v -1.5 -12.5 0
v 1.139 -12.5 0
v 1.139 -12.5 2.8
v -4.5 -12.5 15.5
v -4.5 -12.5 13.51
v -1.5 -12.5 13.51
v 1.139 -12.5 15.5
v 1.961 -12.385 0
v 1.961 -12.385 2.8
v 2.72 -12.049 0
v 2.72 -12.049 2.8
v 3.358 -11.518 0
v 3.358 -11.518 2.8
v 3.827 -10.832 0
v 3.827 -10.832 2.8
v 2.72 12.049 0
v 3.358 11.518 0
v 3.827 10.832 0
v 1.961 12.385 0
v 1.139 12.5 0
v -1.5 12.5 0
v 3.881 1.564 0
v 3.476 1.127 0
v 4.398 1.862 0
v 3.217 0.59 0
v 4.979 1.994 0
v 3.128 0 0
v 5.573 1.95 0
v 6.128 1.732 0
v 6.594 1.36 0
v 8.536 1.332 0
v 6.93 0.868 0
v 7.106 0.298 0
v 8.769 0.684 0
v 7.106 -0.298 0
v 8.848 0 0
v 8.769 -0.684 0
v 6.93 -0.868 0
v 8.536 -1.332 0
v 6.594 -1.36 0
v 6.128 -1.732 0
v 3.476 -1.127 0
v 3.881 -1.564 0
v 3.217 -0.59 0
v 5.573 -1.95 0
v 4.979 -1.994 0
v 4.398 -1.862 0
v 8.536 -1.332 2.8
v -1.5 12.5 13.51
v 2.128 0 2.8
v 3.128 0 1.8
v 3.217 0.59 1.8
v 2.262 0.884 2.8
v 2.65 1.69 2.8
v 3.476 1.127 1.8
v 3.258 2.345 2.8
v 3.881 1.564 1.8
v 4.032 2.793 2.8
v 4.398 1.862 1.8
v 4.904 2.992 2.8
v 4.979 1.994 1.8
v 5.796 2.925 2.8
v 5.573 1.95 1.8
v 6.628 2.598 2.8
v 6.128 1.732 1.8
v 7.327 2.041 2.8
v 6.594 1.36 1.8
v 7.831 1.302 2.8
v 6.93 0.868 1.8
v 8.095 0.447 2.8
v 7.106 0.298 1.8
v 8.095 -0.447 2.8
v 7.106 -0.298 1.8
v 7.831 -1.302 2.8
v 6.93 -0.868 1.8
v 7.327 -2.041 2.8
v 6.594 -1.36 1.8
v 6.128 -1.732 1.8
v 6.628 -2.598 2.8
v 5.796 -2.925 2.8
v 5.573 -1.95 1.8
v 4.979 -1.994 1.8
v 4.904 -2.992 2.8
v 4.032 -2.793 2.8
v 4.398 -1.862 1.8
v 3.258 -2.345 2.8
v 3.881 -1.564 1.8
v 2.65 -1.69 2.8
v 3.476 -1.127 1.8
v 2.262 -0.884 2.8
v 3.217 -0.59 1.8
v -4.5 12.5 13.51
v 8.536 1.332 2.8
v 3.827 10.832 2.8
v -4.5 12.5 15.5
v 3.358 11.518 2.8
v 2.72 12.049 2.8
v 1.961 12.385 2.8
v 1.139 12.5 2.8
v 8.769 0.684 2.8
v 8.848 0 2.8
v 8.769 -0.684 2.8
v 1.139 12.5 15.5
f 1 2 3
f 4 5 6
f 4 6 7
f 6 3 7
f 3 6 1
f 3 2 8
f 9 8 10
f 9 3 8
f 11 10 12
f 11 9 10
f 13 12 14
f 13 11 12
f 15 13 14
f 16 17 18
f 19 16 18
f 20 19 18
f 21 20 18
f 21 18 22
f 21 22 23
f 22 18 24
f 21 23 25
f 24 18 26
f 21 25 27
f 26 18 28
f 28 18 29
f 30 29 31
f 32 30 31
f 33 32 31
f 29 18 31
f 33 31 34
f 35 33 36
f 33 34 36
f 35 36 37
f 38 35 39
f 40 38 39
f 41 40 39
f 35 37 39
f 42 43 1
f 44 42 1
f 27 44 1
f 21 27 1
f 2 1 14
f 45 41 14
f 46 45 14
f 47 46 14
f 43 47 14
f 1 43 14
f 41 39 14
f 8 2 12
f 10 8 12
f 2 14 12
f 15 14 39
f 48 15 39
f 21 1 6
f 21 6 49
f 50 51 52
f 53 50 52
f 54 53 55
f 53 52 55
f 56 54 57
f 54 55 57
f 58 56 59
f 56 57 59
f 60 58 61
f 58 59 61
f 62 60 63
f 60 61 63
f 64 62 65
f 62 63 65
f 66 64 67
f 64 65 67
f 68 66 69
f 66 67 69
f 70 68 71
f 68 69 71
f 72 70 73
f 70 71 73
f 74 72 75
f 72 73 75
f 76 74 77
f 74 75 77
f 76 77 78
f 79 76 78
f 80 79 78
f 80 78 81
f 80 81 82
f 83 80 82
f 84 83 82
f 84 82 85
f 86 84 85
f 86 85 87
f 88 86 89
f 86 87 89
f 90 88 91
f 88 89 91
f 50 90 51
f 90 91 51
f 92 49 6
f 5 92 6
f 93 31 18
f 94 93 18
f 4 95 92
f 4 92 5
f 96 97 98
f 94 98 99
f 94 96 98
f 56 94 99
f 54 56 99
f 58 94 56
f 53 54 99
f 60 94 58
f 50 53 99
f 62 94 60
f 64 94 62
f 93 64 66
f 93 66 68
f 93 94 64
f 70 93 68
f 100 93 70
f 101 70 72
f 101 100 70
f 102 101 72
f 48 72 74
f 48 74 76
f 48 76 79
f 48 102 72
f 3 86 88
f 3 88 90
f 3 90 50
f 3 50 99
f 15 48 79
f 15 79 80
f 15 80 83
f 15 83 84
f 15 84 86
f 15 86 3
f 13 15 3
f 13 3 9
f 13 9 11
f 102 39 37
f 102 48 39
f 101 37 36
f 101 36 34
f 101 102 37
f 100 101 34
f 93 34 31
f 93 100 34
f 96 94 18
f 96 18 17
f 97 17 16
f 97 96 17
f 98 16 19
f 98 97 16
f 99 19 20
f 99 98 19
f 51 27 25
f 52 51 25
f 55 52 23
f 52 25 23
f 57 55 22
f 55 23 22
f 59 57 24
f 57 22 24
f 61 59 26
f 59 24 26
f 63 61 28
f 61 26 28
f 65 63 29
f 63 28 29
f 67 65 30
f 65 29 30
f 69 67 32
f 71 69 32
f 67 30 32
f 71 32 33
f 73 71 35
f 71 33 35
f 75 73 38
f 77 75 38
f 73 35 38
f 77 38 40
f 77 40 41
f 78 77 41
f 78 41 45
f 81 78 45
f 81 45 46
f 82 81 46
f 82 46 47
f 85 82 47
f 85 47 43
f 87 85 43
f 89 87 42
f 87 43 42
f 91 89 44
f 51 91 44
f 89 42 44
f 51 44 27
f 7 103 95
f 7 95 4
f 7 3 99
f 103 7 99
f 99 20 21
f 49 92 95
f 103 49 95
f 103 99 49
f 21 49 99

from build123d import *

# Parameters (mm, degrees)
F1_DEPTH  = 2.8
F2_R      = 3
F3_SIZE   = 1
F1_FACE_W = 25
F1_FACE_H = 2.8
F4_DEPTH  = 1.5
F5_W      = 2.63875
F5_H      = 25
F6_DEPTH  = 12.7
F7_W      = 25
F7_H      = 1.989666
F8_DEPTH  = 3


with BuildPart() as f1:
    # F0 (on Top) → F1 (new body)
    with BuildSketch(Plane.XY):
        with BuildLine():
            Line((9.196268, 0), (7.12831, 0))
            ThreePointArc((7.12831, 0), (5.12831, -2), (3.12831, 0))
            Line((3.12831, 0), (0, 0))
            Line((0, 0), (0, -12.5))
            Line((0, -12.5), (3, -12.5))
            Line((3, -12.5), (9.196268, 0))
        make_face()
        with BuildLine():
            ThreePointArc((3.12831, 0), (5.12831, 2), (7.12831, 0))
            Line((7.12831, 0), (9.196268, 0))
            Line((9.196268, 0), (3, 12.5))
            Line((3, 12.5), (0, 12.5))
            Line((0, 12.5), (0, 0))
            Line((0, 0), (3.12831, 0))
        make_face()
    extrude(amount=F1_DEPTH)

    # F2
    f2_edges = [f1.edges().sort_by_distance(p)[0] for p in [
        (9.196268, 0, 1.4),
        (3, -12.5, 1.4),
        (3, 12.5, 1.4),
    ]]
    fillet(f2_edges, radius=F2_R)

    # F3
    f3_edges = [f1.edges().sort_by_distance(p)[0] for p in [
        (3.12831, 0, 2.8),
    ]]
    chamfer(f3_edges, length=F3_SIZE)

    # F1_face (on face) → F4 (join)
    with BuildSketch(Plane(origin=(0, 0, 1.4), x_dir=(0, -1, 0), z_dir=(-1, 0, 0))):
        Rectangle(F1_FACE_W, F1_FACE_H)
    extrude(amount=F4_DEPTH)

    # F5 (on face) → F6 (join)
    with BuildSketch(Plane.XY.offset(2.8)):
        with Locations((-0.180625, 0)):
            Rectangle(F5_W, F5_H)
    extrude(amount=F6_DEPTH)

    # F7 (on face) → F8 (join)
    with BuildSketch(Plane(origin=(-1.5, 0, 0), x_dir=(0, -1, 0), z_dir=(-1, 0, 0))):
        with Locations((0, 14.505167)):
            Rectangle(F7_W, F7_H)
    extrude(amount=F8_DEPTH)


solid = f1.part
